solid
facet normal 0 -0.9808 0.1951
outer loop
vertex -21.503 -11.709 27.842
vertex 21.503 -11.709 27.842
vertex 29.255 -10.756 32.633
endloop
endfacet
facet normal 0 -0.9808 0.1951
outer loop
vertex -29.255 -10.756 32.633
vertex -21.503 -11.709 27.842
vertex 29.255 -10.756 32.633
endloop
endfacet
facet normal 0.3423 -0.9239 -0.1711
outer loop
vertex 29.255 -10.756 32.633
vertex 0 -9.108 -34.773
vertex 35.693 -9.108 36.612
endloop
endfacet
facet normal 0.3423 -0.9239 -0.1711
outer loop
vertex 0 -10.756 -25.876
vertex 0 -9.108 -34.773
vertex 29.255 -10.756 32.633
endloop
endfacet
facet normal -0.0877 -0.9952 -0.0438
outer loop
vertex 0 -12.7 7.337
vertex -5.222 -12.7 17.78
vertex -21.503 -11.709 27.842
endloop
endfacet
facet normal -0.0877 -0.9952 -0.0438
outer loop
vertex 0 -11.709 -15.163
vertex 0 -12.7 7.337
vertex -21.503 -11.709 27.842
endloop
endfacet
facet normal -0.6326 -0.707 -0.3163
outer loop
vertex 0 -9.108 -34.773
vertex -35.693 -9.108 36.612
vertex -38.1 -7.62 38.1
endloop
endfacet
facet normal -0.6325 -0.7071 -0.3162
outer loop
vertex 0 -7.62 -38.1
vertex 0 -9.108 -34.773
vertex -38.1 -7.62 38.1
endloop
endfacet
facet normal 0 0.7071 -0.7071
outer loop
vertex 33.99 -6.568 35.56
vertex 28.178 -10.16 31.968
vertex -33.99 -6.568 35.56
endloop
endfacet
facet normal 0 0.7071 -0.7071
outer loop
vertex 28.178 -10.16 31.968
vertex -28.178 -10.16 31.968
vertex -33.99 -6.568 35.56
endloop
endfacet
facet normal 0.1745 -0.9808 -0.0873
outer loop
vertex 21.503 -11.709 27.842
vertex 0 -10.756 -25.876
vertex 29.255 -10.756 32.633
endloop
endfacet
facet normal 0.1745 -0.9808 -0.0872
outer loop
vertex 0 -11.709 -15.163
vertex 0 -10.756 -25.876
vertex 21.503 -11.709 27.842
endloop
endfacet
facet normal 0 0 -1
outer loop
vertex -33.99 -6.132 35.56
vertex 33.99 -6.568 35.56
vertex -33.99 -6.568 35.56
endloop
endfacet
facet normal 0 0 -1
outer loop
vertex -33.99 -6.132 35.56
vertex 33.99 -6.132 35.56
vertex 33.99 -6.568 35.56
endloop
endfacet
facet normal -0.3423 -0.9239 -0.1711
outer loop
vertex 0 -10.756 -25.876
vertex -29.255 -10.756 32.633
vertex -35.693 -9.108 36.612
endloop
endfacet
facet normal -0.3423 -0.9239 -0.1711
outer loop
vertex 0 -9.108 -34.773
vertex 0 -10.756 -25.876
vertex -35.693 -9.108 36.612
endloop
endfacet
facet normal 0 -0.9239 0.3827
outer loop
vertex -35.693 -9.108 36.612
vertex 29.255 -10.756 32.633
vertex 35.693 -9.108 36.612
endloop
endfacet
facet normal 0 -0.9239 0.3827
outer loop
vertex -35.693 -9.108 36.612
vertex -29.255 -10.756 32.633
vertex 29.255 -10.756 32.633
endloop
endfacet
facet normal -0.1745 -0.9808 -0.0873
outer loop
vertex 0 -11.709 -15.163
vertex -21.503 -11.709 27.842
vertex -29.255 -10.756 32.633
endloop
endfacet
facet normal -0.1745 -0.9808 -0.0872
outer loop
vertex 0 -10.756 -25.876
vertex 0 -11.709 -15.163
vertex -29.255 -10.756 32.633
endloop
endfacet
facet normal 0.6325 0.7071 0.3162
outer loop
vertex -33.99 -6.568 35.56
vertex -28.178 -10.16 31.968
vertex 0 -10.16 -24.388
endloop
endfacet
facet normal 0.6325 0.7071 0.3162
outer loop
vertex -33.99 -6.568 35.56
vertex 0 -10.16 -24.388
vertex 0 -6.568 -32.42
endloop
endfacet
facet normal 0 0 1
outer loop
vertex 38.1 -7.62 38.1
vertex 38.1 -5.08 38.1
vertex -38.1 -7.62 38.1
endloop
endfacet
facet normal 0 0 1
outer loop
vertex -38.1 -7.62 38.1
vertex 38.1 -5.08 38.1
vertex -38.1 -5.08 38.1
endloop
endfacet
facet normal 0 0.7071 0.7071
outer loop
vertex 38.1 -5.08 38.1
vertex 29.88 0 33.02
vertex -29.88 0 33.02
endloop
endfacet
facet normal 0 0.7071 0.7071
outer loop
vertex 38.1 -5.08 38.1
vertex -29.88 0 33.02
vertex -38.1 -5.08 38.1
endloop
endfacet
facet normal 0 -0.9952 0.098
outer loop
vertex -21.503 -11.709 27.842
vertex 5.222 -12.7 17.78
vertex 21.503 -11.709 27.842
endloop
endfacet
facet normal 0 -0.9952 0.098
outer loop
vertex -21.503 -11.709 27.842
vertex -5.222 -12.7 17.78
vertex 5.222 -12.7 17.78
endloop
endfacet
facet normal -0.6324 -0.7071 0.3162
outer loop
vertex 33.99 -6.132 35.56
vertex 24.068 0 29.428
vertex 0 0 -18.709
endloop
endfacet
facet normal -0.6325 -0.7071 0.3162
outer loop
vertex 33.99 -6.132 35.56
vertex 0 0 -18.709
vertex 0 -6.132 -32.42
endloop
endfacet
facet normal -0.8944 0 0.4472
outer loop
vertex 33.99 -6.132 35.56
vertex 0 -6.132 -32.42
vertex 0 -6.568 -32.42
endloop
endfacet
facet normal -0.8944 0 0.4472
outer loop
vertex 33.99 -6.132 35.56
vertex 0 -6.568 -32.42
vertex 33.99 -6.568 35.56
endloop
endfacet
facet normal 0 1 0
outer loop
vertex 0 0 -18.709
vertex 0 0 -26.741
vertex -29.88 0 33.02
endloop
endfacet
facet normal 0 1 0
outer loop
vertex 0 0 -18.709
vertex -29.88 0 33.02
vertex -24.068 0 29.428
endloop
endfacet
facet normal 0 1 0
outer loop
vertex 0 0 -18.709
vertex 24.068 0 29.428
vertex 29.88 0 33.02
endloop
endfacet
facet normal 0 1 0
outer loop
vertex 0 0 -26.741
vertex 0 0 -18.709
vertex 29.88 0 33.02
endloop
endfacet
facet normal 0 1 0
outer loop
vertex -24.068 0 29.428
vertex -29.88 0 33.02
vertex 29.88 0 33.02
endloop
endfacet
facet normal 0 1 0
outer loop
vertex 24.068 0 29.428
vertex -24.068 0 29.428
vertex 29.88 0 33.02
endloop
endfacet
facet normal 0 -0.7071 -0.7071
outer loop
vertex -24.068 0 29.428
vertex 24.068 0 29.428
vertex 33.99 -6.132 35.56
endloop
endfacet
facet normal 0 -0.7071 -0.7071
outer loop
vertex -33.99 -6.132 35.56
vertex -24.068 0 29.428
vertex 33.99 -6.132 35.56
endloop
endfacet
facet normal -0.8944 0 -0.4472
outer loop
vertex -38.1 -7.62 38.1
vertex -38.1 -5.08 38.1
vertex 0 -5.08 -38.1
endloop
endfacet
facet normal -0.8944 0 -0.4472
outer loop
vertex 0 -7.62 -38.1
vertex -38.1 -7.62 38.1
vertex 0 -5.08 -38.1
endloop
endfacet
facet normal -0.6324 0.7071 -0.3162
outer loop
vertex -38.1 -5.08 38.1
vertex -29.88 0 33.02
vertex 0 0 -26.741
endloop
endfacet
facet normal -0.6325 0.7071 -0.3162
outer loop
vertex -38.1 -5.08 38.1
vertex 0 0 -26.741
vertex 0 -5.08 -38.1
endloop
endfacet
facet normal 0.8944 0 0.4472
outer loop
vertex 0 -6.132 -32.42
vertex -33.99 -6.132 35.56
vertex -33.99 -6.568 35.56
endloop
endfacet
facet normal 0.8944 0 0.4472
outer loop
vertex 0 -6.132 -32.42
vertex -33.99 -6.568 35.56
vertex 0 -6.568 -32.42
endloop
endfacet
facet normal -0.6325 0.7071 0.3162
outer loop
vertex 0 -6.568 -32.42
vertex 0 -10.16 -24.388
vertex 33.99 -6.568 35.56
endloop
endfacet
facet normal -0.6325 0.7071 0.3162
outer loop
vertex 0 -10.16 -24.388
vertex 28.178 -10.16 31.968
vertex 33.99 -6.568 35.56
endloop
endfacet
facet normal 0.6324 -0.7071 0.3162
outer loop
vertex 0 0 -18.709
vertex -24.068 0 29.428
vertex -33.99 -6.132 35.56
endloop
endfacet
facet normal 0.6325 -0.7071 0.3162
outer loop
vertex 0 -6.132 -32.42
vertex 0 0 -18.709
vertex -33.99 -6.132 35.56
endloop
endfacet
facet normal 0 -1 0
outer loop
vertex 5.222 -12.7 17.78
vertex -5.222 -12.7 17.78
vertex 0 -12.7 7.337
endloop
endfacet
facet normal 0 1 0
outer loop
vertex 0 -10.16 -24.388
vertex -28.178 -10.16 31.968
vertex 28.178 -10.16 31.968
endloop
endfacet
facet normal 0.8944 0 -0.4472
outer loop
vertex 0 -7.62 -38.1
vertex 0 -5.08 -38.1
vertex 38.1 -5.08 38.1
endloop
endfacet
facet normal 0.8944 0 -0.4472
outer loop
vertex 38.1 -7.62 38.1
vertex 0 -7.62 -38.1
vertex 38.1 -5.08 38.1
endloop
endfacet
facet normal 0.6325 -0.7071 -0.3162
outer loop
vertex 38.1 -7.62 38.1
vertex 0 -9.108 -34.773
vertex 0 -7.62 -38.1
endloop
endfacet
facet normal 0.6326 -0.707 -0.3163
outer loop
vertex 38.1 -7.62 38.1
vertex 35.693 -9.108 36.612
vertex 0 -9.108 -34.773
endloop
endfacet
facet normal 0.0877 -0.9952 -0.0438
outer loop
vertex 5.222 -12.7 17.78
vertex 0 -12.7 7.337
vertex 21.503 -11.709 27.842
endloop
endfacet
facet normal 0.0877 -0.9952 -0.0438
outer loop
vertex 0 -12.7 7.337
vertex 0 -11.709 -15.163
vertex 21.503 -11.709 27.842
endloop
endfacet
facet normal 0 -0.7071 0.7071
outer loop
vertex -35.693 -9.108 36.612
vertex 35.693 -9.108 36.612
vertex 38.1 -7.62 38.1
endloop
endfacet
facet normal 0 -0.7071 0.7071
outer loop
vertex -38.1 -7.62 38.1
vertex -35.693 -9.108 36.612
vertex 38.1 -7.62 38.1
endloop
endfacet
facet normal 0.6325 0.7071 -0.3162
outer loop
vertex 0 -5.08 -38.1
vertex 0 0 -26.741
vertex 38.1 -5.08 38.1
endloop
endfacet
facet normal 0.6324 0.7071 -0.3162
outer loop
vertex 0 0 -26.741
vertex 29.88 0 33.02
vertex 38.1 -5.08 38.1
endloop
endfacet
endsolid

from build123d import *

# Parameters (mm, degrees)
F1_DEPTH = 12.7
F2_SIZE  = 5.08
F3_T     = -2.54
F4_SIZE  = 5.08
F5_SIZE  = 5.08
F6_SIZE  = 5.08


# Not quite as in the source:
# - a feature of the source that left no trace in its solid (it failed there, or was rolled back) is left out


with BuildPart() as f1:
    # F0 (on Front) → F1 (new body)
    with BuildSketch(Plane.XZ):
        Polygon((0, 0), (-38.1, 38.1), (0, -38.1), align=None)
        Polygon((38.1, 38.1), (-38.1, 38.1), (0, 0), align=None)
        Polygon((0, 0), (0, -38.1), (38.1, 38.1), align=None)
    extrude(amount=F1_DEPTH)

    # F2
    f2_edges = [f1.edges().sort_by_distance(p)[0] for p in [
        (0, -12.7, 38.1),
        (-19.05, -12.7, 0),
        (19.05, -12.7, 0),
        (-19.05, 0, 0),
        (0, 0, 38.1),
        (19.05, 0, 0),
    ]]
    chamfer(f2_edges, length=F2_SIZE)

    # F3
    f3_openings = [f1.faces().sort_by_distance(p)[0] for p in [
        (0, 0, 13.099742),
    ]]
    offset(amount=F3_T, openings=f3_openings, kind=Kind.INTERSECTION)

    # F4
    f4_edges = [f1.edges().sort_by_distance(p)[0] for p in [
        (0, -12.7, 33.02),
        (14.940194, -12.7, 3.139613),
        (-14.940194, -12.7, 3.139613),
    ]]
    chamfer(f4_edges, length=F4_SIZE)

    # F5
    f5_edges = [f1.edges().sort_by_distance(p)[0] for p in [
        (0, -12.7, 27.94),
        (10.830387, -12.7, 6.279225),
        (-10.830387, -12.7, 6.279225),
    ]]
    chamfer(f5_edges, length=F5_SIZE)

    # F6
    f6_edges = [f1.edges().sort_by_distance(p)[0] for p in [
        (0, -12.7, 22.86),
        (6.720581, -12.7, 9.418838),
        (-6.720581, -12.7, 9.418838),
    ]]
    chamfer(f6_edges, length=F6_SIZE)


solid = f1.part
